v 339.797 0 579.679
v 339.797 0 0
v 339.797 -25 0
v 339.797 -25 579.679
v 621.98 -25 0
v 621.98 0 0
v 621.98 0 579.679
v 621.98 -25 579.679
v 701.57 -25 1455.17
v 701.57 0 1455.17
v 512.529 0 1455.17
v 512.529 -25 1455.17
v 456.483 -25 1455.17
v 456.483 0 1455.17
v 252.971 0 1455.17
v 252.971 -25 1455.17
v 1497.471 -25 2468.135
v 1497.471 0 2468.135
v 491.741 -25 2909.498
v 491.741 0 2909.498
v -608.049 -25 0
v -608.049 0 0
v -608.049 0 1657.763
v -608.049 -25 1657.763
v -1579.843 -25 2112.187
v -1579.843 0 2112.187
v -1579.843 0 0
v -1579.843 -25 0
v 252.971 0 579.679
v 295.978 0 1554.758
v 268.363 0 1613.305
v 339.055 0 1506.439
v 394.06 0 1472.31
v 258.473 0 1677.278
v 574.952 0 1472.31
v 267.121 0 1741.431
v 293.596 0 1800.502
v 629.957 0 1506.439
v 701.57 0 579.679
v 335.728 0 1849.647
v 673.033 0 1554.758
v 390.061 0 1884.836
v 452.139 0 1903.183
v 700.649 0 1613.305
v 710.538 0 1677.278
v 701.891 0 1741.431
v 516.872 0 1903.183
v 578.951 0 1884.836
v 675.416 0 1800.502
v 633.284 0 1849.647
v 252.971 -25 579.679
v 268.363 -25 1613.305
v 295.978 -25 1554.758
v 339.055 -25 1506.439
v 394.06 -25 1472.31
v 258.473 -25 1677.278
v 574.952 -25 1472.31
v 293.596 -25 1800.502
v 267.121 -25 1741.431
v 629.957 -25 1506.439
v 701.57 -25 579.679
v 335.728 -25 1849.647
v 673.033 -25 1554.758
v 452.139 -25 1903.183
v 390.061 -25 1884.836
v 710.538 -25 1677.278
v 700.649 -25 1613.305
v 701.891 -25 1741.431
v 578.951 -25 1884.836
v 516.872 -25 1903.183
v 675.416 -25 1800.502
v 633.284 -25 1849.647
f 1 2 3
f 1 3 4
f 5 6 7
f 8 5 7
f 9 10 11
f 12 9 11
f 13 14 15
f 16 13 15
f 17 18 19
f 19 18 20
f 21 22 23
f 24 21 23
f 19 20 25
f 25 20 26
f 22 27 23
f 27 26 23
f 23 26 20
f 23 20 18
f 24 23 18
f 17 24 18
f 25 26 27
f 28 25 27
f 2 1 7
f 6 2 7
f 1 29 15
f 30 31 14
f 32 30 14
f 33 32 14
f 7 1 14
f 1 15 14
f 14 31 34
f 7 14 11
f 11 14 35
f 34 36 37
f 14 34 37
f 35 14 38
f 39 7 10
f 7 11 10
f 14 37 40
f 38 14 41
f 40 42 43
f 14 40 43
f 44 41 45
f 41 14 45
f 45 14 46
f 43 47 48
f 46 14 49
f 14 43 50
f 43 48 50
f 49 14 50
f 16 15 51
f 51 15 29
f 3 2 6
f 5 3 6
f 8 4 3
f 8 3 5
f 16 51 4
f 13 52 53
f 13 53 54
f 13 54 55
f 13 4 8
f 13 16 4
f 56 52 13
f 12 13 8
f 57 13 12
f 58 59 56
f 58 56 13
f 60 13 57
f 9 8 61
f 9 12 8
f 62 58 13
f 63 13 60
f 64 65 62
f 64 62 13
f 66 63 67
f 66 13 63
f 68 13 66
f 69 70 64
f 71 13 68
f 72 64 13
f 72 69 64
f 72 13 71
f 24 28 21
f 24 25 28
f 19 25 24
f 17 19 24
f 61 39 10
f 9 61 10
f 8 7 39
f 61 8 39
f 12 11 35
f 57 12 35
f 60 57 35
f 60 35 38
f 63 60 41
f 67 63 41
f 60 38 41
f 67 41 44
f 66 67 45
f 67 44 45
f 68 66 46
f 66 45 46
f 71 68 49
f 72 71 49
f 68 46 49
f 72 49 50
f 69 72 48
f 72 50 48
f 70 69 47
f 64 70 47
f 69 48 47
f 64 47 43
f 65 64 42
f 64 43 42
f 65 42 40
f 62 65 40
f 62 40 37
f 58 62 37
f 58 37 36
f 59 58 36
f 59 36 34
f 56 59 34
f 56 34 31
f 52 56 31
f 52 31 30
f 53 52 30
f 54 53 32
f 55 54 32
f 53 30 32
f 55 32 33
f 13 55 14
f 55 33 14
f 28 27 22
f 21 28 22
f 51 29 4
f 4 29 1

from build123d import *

# Parameters (mm, degrees)
F2_DEPTH = 25
F0_W     = 282.1830511093
F0_H     = 579.6789526939
F3_DEPTH = 25


with BuildPart() as f2:
    # F1 (on Front) → F2 (new body)
    with BuildSketch(Plane.XZ):
        Polygon((-1579.8434172484, 0), (-608.0491542816, 0), (-608.0491542816, 1657.763004303), (1497.4708557129, 2468.1348800659), (491.7413294315, 2909.4982147217), (-1579.8434172484, 2112.1873323742), align=None)
    extrude(amount=F2_DEPTH)


with BuildPart() as f3:
    # F0 (on Front) → F3 (new body)
    with BuildSketch(Plane.XZ):
        with BuildLine():
            Line((252.9710233212, 579.6789526939), (339.796602726, 579.6789526939))
            Line((339.796602726, 579.6789526939), (621.9796538353, 579.6789526939))
            Line((621.9796538353, 579.6789526939), (701.5697956085, 579.6789526939))
            Line((701.5697956085, 579.6789526939), (701.5697956085, 1455.1701545715))
            Line((701.5697956085, 1455.1701545715), (512.5289377179, 1455.1701545715))
            ThreePointArc((512.5289377179, 1455.1701545715), (484.5058619976, 1453.4263863019), (456.4827862773, 1455.1701545715))
            Line((456.4827862773, 1455.1701545715), (252.9710233212, 1455.1701545715))
            Line((252.9710233212, 1455.1701545715), (252.9710233212, 579.6789526939))
        make_face()
        with Locations((480.8881282806, 289.839476347)):
            Rectangle(F0_W, F0_H)
        with BuildLine():
            ThreePointArc((710.5489419051, 1679.4694662094), (334.9046393593, 1848.9243220241), (456.4827862773, 1455.1701545715))
            Line((456.4827862773, 1455.1701545715), (512.5289377179, 1455.1701545715))
            ThreePointArc((512.5289377179, 1455.1701545715), (653.9607178123, 1529.8682435711), (710.5489419051, 1679.4694662094))
        make_face()
        with BuildLine():
            Line((512.5289377179, 1455.1701545715), (456.4827862773, 1455.1701545715))
            ThreePointArc((456.4827862773, 1455.1701545715), (484.5058619976, 1453.4263863019), (512.5289377179, 1455.1701545715))
        make_face()
    extrude(amount=F3_DEPTH)


solid = Compound([f2.part, f3.part])
